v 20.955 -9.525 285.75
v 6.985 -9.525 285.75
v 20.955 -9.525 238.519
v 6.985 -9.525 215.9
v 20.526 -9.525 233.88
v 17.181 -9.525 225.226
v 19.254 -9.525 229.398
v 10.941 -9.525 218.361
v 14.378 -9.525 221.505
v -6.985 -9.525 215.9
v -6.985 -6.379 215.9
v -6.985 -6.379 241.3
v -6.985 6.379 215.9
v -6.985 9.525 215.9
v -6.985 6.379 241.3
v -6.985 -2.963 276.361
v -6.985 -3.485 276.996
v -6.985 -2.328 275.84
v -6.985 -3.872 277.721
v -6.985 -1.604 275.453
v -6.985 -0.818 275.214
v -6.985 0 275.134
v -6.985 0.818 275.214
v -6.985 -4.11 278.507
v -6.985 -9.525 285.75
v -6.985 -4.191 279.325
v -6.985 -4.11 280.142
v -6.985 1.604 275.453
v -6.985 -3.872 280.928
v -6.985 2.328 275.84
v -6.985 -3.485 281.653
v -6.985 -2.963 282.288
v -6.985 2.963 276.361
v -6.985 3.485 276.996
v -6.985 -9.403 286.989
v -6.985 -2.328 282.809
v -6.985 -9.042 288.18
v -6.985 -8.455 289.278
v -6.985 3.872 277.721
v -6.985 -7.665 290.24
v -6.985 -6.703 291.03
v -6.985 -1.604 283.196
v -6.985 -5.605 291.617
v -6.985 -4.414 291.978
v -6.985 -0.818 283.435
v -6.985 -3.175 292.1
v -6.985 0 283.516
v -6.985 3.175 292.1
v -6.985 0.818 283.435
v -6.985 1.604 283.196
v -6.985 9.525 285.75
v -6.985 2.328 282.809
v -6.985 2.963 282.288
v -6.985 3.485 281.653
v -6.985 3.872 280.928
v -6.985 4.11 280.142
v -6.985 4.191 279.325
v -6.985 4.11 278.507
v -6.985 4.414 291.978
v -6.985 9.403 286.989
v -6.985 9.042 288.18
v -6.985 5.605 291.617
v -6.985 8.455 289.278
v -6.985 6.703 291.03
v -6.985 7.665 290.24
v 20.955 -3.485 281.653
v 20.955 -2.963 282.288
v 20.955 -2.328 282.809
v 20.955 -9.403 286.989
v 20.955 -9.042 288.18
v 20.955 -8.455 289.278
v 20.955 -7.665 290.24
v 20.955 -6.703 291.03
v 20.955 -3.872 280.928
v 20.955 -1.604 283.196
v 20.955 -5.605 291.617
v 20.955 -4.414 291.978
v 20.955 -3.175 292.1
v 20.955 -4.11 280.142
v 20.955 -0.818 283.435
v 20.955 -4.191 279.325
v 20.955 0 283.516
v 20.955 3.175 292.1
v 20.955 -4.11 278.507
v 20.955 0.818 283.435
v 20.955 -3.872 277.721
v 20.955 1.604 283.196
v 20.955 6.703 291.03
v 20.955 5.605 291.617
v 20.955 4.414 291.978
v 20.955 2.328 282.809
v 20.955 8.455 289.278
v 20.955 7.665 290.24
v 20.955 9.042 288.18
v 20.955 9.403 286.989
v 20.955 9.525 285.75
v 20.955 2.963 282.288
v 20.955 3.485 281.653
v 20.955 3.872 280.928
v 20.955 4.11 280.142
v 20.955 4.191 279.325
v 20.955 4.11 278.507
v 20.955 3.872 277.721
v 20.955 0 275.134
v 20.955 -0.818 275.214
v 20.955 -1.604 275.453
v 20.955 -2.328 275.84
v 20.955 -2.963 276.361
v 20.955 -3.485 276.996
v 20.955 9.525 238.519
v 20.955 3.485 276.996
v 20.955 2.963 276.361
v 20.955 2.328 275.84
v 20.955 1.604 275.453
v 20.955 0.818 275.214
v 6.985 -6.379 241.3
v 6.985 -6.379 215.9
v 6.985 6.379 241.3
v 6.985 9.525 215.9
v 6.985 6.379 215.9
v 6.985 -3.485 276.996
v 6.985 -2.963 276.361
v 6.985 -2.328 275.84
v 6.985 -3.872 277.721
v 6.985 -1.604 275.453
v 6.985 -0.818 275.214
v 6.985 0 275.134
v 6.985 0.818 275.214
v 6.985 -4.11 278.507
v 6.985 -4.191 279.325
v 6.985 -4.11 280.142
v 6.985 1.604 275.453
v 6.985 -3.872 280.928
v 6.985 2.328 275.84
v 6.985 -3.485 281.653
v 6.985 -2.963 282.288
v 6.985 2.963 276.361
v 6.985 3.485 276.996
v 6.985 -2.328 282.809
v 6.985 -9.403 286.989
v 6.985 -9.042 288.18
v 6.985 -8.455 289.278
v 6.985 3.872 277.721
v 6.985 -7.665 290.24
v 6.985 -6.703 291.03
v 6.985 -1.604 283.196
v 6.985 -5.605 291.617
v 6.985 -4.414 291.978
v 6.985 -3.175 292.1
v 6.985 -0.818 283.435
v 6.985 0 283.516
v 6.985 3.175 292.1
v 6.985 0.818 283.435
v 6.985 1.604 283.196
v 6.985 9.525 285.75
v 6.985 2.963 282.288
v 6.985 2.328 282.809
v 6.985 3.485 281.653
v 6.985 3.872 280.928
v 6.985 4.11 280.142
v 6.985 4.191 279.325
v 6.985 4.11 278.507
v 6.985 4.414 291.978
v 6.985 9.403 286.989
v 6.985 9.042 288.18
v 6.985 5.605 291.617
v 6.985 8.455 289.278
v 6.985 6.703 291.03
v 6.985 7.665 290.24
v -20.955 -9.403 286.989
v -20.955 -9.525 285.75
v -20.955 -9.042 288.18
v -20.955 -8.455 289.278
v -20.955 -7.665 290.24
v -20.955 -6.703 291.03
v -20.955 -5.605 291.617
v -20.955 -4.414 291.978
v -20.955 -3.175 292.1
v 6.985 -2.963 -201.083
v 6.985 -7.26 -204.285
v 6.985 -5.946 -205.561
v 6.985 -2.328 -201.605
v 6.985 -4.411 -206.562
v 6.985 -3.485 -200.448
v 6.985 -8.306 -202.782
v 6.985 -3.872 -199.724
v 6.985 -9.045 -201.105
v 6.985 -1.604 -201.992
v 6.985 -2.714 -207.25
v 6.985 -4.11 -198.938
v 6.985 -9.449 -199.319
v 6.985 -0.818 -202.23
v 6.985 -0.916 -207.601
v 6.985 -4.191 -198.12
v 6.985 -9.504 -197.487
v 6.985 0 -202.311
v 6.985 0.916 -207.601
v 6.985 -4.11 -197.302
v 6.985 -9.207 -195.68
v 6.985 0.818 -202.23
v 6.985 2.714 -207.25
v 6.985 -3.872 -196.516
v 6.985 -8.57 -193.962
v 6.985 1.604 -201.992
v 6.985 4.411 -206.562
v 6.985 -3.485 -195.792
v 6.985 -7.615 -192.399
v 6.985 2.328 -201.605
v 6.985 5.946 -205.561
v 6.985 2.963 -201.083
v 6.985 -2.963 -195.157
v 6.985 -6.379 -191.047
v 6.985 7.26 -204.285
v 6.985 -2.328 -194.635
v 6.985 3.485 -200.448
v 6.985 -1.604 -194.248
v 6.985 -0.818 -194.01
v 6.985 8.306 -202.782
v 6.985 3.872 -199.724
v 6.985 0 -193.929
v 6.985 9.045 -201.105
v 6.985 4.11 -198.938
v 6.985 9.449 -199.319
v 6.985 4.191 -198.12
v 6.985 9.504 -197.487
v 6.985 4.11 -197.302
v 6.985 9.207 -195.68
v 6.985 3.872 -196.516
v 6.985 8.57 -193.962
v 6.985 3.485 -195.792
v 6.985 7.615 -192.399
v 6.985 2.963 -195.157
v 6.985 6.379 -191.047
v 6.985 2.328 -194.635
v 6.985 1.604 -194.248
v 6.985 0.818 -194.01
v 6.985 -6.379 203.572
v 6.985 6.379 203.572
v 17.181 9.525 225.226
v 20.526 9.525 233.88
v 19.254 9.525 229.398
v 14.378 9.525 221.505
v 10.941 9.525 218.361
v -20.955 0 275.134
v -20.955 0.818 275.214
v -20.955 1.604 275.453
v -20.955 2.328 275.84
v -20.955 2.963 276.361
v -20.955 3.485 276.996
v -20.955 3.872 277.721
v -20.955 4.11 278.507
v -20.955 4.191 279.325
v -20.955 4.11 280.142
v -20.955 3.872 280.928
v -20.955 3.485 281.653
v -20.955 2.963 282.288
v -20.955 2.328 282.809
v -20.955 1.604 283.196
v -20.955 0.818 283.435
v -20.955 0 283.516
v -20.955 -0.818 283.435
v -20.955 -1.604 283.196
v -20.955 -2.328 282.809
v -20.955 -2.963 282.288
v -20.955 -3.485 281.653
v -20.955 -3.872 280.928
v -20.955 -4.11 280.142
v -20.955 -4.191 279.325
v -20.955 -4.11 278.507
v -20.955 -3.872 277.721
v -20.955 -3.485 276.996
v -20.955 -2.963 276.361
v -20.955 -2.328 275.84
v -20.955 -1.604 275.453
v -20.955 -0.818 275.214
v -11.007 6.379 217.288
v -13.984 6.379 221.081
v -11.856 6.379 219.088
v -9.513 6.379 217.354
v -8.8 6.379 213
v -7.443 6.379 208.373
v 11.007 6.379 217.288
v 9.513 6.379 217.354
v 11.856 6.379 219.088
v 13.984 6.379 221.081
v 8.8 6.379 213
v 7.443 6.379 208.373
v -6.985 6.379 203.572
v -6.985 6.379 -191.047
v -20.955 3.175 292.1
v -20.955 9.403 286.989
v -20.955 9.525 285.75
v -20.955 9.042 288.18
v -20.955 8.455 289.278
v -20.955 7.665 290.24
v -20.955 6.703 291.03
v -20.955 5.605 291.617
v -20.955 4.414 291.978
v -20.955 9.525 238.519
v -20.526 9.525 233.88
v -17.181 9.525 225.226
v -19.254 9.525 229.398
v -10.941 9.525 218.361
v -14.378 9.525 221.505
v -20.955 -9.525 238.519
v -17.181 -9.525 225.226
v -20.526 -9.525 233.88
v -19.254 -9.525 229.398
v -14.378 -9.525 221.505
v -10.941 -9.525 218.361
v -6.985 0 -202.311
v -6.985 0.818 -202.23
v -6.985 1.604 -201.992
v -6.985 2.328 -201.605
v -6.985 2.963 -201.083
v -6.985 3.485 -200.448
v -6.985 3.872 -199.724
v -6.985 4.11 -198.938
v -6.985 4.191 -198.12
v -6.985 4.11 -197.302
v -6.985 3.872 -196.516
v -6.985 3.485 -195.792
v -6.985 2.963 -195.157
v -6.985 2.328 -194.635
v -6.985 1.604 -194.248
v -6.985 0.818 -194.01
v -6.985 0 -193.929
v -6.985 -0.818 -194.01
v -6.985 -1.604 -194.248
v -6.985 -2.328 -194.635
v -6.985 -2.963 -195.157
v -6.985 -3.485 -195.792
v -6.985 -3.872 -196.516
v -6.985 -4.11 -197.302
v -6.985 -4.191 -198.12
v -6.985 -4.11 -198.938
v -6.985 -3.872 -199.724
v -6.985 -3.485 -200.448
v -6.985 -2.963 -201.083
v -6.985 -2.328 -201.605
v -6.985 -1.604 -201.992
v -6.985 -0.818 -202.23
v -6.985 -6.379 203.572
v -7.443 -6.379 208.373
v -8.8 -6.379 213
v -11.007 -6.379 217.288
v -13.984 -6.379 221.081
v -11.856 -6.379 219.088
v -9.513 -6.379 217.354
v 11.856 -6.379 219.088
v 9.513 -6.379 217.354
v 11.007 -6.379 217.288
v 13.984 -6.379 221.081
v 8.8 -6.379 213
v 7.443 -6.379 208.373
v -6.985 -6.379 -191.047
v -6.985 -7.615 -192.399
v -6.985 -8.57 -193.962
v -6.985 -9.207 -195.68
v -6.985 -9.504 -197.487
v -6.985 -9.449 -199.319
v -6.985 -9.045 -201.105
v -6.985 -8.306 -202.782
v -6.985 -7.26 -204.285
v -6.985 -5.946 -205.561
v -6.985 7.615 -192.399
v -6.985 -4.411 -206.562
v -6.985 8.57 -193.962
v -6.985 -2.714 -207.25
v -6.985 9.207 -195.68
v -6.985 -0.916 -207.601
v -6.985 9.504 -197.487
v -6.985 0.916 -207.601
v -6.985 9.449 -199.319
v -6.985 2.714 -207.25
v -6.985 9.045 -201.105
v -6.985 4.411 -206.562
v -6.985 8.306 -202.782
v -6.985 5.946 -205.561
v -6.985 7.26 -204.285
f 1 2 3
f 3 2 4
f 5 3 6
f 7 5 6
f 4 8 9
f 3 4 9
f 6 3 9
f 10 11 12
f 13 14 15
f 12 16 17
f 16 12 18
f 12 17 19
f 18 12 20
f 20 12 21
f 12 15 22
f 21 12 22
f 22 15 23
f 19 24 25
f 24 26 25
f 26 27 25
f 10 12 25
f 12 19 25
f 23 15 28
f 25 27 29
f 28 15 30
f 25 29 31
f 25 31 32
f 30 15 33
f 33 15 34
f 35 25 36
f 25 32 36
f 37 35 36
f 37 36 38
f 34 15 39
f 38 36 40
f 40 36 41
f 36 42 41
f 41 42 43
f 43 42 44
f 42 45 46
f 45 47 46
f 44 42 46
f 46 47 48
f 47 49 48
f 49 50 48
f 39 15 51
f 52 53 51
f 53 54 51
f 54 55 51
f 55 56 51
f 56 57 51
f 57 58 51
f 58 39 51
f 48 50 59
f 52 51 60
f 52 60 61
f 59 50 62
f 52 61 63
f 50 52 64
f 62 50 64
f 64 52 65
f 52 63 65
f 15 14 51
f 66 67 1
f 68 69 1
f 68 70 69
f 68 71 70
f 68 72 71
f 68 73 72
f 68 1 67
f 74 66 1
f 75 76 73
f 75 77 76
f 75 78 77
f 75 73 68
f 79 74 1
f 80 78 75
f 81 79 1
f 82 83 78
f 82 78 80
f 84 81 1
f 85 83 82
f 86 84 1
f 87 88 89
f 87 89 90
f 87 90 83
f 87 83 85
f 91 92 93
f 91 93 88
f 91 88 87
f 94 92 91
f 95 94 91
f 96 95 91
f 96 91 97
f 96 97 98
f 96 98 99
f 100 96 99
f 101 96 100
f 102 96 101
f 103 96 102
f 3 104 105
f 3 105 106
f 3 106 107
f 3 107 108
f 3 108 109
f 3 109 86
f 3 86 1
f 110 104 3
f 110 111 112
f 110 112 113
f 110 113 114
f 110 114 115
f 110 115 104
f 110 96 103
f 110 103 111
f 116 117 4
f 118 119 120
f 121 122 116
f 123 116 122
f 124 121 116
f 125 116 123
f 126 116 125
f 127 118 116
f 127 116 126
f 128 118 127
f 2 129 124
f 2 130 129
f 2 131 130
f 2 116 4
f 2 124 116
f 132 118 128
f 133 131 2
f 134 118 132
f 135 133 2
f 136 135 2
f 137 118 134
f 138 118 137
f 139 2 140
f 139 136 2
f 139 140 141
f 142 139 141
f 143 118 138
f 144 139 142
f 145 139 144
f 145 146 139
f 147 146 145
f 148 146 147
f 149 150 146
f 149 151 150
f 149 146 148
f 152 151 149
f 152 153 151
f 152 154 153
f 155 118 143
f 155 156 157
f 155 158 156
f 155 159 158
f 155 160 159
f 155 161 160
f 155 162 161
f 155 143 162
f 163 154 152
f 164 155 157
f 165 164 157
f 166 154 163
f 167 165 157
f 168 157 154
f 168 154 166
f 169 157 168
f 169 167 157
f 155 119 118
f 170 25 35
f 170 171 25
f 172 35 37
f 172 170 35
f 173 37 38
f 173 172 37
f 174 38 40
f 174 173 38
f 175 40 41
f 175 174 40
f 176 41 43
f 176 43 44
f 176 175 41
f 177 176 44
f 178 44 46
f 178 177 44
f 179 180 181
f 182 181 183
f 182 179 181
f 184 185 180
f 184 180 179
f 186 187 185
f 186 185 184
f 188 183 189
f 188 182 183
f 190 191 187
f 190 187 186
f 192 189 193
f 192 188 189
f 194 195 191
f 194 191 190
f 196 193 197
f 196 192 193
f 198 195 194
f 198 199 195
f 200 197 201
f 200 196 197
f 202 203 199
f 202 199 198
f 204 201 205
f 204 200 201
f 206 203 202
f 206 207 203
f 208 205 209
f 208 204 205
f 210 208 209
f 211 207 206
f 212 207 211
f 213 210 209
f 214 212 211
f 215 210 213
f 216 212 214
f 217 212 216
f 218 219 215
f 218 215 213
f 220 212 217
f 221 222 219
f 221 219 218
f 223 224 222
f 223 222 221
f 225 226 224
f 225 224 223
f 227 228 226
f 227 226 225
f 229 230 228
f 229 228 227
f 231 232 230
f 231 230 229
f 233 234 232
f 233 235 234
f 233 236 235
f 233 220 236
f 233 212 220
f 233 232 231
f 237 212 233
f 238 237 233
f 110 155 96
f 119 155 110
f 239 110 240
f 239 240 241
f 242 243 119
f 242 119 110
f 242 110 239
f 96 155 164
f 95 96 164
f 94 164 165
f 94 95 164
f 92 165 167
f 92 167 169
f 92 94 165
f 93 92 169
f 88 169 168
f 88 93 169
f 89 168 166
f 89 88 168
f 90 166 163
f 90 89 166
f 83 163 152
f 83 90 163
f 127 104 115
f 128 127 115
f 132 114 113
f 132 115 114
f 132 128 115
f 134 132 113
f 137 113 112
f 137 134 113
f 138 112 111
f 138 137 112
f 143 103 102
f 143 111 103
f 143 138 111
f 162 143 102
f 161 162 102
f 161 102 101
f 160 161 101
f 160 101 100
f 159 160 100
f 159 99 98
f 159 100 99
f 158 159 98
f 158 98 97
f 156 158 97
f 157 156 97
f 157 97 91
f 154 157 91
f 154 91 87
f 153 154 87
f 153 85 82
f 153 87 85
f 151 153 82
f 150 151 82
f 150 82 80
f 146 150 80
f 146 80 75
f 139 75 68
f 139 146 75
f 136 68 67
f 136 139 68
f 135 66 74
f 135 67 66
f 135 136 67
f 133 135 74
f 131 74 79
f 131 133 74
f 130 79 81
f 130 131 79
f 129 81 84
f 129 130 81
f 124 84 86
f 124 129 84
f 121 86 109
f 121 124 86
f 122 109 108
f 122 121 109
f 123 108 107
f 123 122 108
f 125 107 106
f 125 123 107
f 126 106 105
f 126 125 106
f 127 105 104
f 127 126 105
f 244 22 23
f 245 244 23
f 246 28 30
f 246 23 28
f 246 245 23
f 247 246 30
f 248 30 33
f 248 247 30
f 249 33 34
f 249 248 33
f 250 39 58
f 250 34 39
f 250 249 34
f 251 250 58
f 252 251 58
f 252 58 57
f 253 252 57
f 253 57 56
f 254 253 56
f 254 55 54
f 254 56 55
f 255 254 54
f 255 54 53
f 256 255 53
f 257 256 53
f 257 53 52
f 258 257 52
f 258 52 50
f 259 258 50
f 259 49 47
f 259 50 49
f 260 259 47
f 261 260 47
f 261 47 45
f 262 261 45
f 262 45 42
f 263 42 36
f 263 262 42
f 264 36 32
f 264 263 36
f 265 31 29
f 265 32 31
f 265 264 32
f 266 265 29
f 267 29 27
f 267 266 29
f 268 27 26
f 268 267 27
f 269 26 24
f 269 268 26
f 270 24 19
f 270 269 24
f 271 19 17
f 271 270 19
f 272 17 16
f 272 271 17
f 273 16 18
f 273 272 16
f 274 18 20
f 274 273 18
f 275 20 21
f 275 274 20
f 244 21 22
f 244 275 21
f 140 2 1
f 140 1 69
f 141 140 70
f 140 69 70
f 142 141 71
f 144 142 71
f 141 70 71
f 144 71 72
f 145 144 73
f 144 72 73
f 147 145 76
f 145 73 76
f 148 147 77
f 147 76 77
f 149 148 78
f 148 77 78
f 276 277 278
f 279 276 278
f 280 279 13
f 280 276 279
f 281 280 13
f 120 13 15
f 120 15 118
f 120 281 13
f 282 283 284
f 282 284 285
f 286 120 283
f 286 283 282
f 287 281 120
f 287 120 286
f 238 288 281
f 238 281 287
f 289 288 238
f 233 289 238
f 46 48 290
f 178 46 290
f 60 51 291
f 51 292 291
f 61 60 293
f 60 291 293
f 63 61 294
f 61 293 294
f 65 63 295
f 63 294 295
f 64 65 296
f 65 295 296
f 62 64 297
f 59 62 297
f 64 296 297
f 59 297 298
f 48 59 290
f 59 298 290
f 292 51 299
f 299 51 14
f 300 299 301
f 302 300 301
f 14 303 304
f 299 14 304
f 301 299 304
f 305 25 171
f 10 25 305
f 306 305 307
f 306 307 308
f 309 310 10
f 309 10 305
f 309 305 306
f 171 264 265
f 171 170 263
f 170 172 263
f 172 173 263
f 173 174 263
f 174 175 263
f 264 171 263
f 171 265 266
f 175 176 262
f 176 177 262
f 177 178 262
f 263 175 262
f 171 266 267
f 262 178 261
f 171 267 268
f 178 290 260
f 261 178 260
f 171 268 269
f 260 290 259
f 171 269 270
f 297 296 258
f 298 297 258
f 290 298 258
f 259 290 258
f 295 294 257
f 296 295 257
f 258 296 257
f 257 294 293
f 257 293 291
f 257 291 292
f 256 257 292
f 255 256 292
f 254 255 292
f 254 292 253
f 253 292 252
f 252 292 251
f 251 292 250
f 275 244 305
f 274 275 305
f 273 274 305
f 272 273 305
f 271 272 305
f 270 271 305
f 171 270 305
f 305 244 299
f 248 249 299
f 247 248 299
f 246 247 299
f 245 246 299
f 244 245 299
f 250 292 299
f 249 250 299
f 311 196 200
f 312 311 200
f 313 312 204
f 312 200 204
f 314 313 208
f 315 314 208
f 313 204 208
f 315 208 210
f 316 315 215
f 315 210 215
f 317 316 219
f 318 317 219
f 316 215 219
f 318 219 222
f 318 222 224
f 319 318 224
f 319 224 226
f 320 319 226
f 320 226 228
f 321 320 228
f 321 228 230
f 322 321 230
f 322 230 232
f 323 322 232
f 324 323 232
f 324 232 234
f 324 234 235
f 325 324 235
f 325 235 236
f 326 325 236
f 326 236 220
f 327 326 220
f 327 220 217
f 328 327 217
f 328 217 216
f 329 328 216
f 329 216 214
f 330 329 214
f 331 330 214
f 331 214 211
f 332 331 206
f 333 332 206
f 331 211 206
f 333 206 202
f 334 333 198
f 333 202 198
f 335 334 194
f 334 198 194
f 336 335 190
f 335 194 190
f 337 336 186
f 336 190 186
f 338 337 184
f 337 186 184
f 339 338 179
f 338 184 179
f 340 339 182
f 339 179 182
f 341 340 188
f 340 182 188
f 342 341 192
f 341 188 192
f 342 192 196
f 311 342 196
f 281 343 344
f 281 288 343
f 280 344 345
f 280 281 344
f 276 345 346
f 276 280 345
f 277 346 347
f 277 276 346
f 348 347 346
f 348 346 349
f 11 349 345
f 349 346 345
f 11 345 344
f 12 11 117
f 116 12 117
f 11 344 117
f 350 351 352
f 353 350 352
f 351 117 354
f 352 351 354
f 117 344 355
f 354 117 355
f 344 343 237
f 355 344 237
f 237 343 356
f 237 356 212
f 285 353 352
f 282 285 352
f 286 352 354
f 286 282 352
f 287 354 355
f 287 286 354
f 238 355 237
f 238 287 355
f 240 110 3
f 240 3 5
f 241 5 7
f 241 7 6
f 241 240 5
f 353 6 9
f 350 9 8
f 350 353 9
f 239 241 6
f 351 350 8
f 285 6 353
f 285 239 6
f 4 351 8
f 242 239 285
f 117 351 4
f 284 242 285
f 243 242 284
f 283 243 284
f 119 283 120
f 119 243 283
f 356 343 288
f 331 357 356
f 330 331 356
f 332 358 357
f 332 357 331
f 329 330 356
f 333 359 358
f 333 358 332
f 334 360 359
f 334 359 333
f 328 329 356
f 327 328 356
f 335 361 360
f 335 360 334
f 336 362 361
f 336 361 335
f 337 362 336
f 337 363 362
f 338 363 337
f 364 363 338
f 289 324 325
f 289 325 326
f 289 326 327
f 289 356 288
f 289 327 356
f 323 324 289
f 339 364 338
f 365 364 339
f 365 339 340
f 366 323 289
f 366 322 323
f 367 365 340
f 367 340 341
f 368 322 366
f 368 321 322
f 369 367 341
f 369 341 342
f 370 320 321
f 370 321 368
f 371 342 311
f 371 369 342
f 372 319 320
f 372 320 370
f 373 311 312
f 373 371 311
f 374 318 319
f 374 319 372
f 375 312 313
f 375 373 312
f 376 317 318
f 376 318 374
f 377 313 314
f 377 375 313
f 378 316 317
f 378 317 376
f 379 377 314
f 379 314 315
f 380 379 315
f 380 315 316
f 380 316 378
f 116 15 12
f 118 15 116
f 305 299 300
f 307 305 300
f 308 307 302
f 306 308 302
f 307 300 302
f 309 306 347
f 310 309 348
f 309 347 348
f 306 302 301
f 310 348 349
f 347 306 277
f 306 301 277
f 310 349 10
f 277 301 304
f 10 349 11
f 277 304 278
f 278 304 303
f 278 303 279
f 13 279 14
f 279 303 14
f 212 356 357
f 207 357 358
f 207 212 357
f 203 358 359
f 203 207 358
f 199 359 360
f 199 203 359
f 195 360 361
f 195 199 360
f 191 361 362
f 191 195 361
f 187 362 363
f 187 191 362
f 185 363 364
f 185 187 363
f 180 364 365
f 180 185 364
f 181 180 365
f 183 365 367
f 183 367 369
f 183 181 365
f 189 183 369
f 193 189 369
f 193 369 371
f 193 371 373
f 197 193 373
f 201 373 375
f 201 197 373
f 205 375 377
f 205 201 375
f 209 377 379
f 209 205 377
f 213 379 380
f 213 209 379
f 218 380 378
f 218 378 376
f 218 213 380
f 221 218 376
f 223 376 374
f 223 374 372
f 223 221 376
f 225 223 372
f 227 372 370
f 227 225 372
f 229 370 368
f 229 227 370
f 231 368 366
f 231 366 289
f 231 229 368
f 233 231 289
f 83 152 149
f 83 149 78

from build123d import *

# Parameters (mm, degrees)
BOSS_EXTRUDE1_DEPTH             = 241.3
BOSS_EXTRUDE1_DEPTH_BACK        = 198.12
SKETCH1_W                       = 13.97
SKETCH1_H                       = 12.758728324
BOSS_EXTRUDE2_REACH             = 243.485
SKETCH2_R                       = 9.525
BOSS_EXTRUDE2_DIRECTION_2_REACH = 243.485
SKETCH3_R                       = 4.191
CUT_EXTRUDE1_DEPTH              = 242.891662785
BOSS_EXTRUDE3_DEPTH             = 9.525
FILLET4_R                       = 25.4
FILLET5_R                       = 6.35
CUT_EXTRUDE2_DEPTH              = 294.005542012
CUT_EXTRUDE2_DEPTH_BACK         = 294.005542012
SKETCH6_R                       = 4.191


with BuildPart() as part:
    # Sketch1 → Boss-Extrude1 (new, two sides: drawn at the far end of the back side and taken through both)
    with BuildSketch(Plane.XY.offset(-BOSS_EXTRUDE1_DEPTH_BACK)):
        Rectangle(SKETCH1_W, SKETCH1_H)
    extrude(amount=BOSS_EXTRUDE1_DEPTH + BOSS_EXTRUDE1_DEPTH_BACK)

    # Boss-Extrude2: up to this face of the body (flat: up to its plane)
    boss_extrude2_end = Plane(part.part.faces().sort_by_distance((6.985, 0, 21.59))[0])
    # Sketch2 → Boss-Extrude2 (add, up to the picked face)
    with BuildSketch(Plane(origin=(0, 0, 0), x_dir=(0, 0, -1), z_dir=(1, 0, 0)), mode=Mode.PRIVATE) as boss_extrude2_sk1:
        with Locations((198.12, 0)):
            Circle(SKETCH2_R)
    boss_extrude2_tool1 = split(extrude(boss_extrude2_sk1.sketch, amount=BOSS_EXTRUDE2_REACH, mode=Mode.PRIVATE), bisect_by=boss_extrude2_end, keep=Keep.BOTH, mode=Mode.PRIVATE)
    add(boss_extrude2_tool1.solids().sort_by(Axis((0, 0, -198.12), (1, 0, 0)))[0])

    # Boss-Extrude2 direction 2: up to this face of the body (flat: up to its plane)
    boss_extrude2_direction_2_end = Plane(part.part.faces().sort_by_distance((-6.985, 0, 21.59))[0])
    # Sketch2 → Boss-Extrude2 direction 2 (add, up to the picked face)
    with BuildSketch(Plane(origin=(0, 0, 0), x_dir=(0, 0, -1), z_dir=(1, 0, 0)), mode=Mode.PRIVATE) as boss_extrude2_direction_2_sk1:
        with Locations((198.12, 0)):
            Circle(SKETCH2_R)
    boss_extrude2_direction_2_tool1 = split(extrude(boss_extrude2_direction_2_sk1.sketch, amount=-BOSS_EXTRUDE2_DIRECTION_2_REACH, mode=Mode.PRIVATE), bisect_by=boss_extrude2_direction_2_end, keep=Keep.BOTH, mode=Mode.PRIVATE)
    add(boss_extrude2_direction_2_tool1.solids().sort_by(Axis((0, 0, -198.12), (-1, 0, 0)))[0])

    # Sketch3 → Cut-Extrude1 (cut, through all)
    with BuildSketch(Plane(origin=(6.985, 0, 0), x_dir=(0, 0, -1), z_dir=(1, 0, 0))):
        with Locations((198.12, 0)):
            Circle(SKETCH3_R)
    extrude(amount=-CUT_EXTRUDE1_DEPTH, mode=Mode.SUBTRACT)

    # Sketch4 → Boss-Extrude3 (add, symmetric)
    with BuildSketch(Plane(origin=(0, 0, 0), x_dir=(1, 0, 0), z_dir=(0, 1, 0))):
        with BuildLine():
            Line((-6.985, -241.3), (-6.985, -292.1))
            Line((-6.985, -292.1), (-20.955, -292.1))
            Line((-20.955, -292.1), (-20.955, -238.518716551))
            ThreePointArc((-20.955, -238.518716551), (-17.180965419, -225.226169406), (-6.985, -215.9))
            Line((-6.985, -215.9), (-6.985, -241.3))
        make_face()
    boss_extrude3 = extrude(amount=BOSS_EXTRUDE3_DEPTH, both=True)

    # Mirror1: Boss-Extrude3 across plane
    add(boss_extrude3.mirror(Plane(origin=(0, 0, 0), x_dir=(0, 0, 1), z_dir=(1, 0, 0))))

    # Fillet4
    fillet4_edges = [part.edges().sort_by_distance(p)[0] for p in [
        (-6.985, 0, 215.9),
        (6.985, 0, 215.9),
    ]]
    fillet(fillet4_edges, radius=FILLET4_R)

    # Fillet5
    fillet5_edges = [part.edges().sort_by_distance(p)[0] for p in [
        (-13.97, -9.525, 292.1),
        (-13.97, 9.525, 292.1),
        (13.97, 9.525, 292.1),
        (13.97, -9.525, 292.1),
    ]]
    fillet(fillet5_edges, radius=FILLET5_R)

    # Sketch6 → Cut-Extrude2 (cut, two sides: drawn at the far end of the back side and taken through both)
    with BuildSketch(Plane(origin=(0, 0, 0), x_dir=(0, 0, -1), z_dir=(1, 0, 0)).offset(-CUT_EXTRUDE2_DEPTH_BACK)):
        with Locations((-279.32450026, 0)):
            Circle(SKETCH6_R)
    extrude(amount=CUT_EXTRUDE2_DEPTH + CUT_EXTRUDE2_DEPTH_BACK, mode=Mode.SUBTRACT)


solid = part.part
